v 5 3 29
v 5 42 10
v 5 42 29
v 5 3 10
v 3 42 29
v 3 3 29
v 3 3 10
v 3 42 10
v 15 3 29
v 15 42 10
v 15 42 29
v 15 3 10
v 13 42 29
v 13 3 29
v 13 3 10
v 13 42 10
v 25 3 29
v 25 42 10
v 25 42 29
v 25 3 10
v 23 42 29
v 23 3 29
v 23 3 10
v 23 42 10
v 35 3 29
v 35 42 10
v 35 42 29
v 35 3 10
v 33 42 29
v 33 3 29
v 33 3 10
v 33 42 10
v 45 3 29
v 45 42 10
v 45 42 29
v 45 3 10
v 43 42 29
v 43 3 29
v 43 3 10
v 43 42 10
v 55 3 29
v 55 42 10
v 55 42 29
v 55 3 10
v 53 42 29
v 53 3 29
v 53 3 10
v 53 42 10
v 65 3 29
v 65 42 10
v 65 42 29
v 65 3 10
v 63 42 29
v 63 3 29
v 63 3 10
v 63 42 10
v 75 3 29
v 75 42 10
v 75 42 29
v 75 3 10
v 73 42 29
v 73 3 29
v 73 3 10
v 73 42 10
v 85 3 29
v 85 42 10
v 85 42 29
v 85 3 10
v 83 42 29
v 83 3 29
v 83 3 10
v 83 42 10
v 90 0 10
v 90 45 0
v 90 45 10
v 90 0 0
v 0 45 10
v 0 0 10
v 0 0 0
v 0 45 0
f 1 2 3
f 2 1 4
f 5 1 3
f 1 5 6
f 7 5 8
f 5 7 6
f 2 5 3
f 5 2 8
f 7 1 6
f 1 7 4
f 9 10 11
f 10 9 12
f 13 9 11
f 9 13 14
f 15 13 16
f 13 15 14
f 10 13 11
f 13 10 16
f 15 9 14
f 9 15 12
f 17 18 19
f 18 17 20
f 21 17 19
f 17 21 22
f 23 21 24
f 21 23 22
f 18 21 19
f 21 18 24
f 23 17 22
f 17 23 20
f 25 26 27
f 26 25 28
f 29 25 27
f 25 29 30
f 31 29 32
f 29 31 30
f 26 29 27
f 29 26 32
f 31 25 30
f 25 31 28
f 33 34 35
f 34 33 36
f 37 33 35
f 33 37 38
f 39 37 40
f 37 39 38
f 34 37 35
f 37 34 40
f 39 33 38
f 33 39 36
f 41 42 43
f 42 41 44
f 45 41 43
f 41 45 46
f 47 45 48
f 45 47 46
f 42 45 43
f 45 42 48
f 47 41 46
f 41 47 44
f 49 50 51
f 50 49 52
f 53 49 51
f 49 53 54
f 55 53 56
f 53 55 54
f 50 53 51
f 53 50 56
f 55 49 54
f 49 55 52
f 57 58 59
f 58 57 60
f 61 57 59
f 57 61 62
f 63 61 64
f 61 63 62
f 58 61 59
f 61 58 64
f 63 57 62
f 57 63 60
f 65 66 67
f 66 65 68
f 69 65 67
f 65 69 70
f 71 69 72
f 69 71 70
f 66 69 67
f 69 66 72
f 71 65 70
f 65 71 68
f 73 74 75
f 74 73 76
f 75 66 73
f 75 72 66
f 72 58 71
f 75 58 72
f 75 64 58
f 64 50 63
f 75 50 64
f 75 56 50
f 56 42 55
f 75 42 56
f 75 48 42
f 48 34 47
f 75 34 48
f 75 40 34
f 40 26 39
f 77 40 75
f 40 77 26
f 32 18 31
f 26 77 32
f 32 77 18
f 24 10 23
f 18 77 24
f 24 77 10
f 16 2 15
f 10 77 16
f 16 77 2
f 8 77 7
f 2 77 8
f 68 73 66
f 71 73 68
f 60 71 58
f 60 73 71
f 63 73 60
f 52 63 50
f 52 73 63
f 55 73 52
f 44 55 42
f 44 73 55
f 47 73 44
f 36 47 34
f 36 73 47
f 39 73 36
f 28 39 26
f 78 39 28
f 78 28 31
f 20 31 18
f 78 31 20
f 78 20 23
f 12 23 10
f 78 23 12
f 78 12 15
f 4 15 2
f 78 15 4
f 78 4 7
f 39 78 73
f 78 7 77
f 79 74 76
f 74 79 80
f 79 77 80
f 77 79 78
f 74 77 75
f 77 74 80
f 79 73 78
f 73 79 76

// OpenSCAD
$fn = 32;

// ----------------------------------------------------------------------
// Heatsink: uniform fin block
// ----------------------------------------------------------------------

// --- parameters (mm) ---
base_l = 90;              // base length, X
base_w = 45;              // base width, Y
base_t = 10;              // base plate thickness
fin_h = 20;               // fin height above the base
fin_t = 2;                // fin thickness
edge = 3;                 // margin from the base ends
pitch = 10;               // fin pitch

n_fins = floor((base_l - 2 * edge - fin_t) / pitch) + 1;  // fin count
total_h = base_t + fin_h - 1;  // overall height

union() {
  cube([base_l, base_w, base_t]);
  for (i = [0 : n_fins - 1])
    translate([edge + i * pitch, edge, base_t - 1])
      cube([fin_t, base_w - 2 * edge, fin_h]);
}
